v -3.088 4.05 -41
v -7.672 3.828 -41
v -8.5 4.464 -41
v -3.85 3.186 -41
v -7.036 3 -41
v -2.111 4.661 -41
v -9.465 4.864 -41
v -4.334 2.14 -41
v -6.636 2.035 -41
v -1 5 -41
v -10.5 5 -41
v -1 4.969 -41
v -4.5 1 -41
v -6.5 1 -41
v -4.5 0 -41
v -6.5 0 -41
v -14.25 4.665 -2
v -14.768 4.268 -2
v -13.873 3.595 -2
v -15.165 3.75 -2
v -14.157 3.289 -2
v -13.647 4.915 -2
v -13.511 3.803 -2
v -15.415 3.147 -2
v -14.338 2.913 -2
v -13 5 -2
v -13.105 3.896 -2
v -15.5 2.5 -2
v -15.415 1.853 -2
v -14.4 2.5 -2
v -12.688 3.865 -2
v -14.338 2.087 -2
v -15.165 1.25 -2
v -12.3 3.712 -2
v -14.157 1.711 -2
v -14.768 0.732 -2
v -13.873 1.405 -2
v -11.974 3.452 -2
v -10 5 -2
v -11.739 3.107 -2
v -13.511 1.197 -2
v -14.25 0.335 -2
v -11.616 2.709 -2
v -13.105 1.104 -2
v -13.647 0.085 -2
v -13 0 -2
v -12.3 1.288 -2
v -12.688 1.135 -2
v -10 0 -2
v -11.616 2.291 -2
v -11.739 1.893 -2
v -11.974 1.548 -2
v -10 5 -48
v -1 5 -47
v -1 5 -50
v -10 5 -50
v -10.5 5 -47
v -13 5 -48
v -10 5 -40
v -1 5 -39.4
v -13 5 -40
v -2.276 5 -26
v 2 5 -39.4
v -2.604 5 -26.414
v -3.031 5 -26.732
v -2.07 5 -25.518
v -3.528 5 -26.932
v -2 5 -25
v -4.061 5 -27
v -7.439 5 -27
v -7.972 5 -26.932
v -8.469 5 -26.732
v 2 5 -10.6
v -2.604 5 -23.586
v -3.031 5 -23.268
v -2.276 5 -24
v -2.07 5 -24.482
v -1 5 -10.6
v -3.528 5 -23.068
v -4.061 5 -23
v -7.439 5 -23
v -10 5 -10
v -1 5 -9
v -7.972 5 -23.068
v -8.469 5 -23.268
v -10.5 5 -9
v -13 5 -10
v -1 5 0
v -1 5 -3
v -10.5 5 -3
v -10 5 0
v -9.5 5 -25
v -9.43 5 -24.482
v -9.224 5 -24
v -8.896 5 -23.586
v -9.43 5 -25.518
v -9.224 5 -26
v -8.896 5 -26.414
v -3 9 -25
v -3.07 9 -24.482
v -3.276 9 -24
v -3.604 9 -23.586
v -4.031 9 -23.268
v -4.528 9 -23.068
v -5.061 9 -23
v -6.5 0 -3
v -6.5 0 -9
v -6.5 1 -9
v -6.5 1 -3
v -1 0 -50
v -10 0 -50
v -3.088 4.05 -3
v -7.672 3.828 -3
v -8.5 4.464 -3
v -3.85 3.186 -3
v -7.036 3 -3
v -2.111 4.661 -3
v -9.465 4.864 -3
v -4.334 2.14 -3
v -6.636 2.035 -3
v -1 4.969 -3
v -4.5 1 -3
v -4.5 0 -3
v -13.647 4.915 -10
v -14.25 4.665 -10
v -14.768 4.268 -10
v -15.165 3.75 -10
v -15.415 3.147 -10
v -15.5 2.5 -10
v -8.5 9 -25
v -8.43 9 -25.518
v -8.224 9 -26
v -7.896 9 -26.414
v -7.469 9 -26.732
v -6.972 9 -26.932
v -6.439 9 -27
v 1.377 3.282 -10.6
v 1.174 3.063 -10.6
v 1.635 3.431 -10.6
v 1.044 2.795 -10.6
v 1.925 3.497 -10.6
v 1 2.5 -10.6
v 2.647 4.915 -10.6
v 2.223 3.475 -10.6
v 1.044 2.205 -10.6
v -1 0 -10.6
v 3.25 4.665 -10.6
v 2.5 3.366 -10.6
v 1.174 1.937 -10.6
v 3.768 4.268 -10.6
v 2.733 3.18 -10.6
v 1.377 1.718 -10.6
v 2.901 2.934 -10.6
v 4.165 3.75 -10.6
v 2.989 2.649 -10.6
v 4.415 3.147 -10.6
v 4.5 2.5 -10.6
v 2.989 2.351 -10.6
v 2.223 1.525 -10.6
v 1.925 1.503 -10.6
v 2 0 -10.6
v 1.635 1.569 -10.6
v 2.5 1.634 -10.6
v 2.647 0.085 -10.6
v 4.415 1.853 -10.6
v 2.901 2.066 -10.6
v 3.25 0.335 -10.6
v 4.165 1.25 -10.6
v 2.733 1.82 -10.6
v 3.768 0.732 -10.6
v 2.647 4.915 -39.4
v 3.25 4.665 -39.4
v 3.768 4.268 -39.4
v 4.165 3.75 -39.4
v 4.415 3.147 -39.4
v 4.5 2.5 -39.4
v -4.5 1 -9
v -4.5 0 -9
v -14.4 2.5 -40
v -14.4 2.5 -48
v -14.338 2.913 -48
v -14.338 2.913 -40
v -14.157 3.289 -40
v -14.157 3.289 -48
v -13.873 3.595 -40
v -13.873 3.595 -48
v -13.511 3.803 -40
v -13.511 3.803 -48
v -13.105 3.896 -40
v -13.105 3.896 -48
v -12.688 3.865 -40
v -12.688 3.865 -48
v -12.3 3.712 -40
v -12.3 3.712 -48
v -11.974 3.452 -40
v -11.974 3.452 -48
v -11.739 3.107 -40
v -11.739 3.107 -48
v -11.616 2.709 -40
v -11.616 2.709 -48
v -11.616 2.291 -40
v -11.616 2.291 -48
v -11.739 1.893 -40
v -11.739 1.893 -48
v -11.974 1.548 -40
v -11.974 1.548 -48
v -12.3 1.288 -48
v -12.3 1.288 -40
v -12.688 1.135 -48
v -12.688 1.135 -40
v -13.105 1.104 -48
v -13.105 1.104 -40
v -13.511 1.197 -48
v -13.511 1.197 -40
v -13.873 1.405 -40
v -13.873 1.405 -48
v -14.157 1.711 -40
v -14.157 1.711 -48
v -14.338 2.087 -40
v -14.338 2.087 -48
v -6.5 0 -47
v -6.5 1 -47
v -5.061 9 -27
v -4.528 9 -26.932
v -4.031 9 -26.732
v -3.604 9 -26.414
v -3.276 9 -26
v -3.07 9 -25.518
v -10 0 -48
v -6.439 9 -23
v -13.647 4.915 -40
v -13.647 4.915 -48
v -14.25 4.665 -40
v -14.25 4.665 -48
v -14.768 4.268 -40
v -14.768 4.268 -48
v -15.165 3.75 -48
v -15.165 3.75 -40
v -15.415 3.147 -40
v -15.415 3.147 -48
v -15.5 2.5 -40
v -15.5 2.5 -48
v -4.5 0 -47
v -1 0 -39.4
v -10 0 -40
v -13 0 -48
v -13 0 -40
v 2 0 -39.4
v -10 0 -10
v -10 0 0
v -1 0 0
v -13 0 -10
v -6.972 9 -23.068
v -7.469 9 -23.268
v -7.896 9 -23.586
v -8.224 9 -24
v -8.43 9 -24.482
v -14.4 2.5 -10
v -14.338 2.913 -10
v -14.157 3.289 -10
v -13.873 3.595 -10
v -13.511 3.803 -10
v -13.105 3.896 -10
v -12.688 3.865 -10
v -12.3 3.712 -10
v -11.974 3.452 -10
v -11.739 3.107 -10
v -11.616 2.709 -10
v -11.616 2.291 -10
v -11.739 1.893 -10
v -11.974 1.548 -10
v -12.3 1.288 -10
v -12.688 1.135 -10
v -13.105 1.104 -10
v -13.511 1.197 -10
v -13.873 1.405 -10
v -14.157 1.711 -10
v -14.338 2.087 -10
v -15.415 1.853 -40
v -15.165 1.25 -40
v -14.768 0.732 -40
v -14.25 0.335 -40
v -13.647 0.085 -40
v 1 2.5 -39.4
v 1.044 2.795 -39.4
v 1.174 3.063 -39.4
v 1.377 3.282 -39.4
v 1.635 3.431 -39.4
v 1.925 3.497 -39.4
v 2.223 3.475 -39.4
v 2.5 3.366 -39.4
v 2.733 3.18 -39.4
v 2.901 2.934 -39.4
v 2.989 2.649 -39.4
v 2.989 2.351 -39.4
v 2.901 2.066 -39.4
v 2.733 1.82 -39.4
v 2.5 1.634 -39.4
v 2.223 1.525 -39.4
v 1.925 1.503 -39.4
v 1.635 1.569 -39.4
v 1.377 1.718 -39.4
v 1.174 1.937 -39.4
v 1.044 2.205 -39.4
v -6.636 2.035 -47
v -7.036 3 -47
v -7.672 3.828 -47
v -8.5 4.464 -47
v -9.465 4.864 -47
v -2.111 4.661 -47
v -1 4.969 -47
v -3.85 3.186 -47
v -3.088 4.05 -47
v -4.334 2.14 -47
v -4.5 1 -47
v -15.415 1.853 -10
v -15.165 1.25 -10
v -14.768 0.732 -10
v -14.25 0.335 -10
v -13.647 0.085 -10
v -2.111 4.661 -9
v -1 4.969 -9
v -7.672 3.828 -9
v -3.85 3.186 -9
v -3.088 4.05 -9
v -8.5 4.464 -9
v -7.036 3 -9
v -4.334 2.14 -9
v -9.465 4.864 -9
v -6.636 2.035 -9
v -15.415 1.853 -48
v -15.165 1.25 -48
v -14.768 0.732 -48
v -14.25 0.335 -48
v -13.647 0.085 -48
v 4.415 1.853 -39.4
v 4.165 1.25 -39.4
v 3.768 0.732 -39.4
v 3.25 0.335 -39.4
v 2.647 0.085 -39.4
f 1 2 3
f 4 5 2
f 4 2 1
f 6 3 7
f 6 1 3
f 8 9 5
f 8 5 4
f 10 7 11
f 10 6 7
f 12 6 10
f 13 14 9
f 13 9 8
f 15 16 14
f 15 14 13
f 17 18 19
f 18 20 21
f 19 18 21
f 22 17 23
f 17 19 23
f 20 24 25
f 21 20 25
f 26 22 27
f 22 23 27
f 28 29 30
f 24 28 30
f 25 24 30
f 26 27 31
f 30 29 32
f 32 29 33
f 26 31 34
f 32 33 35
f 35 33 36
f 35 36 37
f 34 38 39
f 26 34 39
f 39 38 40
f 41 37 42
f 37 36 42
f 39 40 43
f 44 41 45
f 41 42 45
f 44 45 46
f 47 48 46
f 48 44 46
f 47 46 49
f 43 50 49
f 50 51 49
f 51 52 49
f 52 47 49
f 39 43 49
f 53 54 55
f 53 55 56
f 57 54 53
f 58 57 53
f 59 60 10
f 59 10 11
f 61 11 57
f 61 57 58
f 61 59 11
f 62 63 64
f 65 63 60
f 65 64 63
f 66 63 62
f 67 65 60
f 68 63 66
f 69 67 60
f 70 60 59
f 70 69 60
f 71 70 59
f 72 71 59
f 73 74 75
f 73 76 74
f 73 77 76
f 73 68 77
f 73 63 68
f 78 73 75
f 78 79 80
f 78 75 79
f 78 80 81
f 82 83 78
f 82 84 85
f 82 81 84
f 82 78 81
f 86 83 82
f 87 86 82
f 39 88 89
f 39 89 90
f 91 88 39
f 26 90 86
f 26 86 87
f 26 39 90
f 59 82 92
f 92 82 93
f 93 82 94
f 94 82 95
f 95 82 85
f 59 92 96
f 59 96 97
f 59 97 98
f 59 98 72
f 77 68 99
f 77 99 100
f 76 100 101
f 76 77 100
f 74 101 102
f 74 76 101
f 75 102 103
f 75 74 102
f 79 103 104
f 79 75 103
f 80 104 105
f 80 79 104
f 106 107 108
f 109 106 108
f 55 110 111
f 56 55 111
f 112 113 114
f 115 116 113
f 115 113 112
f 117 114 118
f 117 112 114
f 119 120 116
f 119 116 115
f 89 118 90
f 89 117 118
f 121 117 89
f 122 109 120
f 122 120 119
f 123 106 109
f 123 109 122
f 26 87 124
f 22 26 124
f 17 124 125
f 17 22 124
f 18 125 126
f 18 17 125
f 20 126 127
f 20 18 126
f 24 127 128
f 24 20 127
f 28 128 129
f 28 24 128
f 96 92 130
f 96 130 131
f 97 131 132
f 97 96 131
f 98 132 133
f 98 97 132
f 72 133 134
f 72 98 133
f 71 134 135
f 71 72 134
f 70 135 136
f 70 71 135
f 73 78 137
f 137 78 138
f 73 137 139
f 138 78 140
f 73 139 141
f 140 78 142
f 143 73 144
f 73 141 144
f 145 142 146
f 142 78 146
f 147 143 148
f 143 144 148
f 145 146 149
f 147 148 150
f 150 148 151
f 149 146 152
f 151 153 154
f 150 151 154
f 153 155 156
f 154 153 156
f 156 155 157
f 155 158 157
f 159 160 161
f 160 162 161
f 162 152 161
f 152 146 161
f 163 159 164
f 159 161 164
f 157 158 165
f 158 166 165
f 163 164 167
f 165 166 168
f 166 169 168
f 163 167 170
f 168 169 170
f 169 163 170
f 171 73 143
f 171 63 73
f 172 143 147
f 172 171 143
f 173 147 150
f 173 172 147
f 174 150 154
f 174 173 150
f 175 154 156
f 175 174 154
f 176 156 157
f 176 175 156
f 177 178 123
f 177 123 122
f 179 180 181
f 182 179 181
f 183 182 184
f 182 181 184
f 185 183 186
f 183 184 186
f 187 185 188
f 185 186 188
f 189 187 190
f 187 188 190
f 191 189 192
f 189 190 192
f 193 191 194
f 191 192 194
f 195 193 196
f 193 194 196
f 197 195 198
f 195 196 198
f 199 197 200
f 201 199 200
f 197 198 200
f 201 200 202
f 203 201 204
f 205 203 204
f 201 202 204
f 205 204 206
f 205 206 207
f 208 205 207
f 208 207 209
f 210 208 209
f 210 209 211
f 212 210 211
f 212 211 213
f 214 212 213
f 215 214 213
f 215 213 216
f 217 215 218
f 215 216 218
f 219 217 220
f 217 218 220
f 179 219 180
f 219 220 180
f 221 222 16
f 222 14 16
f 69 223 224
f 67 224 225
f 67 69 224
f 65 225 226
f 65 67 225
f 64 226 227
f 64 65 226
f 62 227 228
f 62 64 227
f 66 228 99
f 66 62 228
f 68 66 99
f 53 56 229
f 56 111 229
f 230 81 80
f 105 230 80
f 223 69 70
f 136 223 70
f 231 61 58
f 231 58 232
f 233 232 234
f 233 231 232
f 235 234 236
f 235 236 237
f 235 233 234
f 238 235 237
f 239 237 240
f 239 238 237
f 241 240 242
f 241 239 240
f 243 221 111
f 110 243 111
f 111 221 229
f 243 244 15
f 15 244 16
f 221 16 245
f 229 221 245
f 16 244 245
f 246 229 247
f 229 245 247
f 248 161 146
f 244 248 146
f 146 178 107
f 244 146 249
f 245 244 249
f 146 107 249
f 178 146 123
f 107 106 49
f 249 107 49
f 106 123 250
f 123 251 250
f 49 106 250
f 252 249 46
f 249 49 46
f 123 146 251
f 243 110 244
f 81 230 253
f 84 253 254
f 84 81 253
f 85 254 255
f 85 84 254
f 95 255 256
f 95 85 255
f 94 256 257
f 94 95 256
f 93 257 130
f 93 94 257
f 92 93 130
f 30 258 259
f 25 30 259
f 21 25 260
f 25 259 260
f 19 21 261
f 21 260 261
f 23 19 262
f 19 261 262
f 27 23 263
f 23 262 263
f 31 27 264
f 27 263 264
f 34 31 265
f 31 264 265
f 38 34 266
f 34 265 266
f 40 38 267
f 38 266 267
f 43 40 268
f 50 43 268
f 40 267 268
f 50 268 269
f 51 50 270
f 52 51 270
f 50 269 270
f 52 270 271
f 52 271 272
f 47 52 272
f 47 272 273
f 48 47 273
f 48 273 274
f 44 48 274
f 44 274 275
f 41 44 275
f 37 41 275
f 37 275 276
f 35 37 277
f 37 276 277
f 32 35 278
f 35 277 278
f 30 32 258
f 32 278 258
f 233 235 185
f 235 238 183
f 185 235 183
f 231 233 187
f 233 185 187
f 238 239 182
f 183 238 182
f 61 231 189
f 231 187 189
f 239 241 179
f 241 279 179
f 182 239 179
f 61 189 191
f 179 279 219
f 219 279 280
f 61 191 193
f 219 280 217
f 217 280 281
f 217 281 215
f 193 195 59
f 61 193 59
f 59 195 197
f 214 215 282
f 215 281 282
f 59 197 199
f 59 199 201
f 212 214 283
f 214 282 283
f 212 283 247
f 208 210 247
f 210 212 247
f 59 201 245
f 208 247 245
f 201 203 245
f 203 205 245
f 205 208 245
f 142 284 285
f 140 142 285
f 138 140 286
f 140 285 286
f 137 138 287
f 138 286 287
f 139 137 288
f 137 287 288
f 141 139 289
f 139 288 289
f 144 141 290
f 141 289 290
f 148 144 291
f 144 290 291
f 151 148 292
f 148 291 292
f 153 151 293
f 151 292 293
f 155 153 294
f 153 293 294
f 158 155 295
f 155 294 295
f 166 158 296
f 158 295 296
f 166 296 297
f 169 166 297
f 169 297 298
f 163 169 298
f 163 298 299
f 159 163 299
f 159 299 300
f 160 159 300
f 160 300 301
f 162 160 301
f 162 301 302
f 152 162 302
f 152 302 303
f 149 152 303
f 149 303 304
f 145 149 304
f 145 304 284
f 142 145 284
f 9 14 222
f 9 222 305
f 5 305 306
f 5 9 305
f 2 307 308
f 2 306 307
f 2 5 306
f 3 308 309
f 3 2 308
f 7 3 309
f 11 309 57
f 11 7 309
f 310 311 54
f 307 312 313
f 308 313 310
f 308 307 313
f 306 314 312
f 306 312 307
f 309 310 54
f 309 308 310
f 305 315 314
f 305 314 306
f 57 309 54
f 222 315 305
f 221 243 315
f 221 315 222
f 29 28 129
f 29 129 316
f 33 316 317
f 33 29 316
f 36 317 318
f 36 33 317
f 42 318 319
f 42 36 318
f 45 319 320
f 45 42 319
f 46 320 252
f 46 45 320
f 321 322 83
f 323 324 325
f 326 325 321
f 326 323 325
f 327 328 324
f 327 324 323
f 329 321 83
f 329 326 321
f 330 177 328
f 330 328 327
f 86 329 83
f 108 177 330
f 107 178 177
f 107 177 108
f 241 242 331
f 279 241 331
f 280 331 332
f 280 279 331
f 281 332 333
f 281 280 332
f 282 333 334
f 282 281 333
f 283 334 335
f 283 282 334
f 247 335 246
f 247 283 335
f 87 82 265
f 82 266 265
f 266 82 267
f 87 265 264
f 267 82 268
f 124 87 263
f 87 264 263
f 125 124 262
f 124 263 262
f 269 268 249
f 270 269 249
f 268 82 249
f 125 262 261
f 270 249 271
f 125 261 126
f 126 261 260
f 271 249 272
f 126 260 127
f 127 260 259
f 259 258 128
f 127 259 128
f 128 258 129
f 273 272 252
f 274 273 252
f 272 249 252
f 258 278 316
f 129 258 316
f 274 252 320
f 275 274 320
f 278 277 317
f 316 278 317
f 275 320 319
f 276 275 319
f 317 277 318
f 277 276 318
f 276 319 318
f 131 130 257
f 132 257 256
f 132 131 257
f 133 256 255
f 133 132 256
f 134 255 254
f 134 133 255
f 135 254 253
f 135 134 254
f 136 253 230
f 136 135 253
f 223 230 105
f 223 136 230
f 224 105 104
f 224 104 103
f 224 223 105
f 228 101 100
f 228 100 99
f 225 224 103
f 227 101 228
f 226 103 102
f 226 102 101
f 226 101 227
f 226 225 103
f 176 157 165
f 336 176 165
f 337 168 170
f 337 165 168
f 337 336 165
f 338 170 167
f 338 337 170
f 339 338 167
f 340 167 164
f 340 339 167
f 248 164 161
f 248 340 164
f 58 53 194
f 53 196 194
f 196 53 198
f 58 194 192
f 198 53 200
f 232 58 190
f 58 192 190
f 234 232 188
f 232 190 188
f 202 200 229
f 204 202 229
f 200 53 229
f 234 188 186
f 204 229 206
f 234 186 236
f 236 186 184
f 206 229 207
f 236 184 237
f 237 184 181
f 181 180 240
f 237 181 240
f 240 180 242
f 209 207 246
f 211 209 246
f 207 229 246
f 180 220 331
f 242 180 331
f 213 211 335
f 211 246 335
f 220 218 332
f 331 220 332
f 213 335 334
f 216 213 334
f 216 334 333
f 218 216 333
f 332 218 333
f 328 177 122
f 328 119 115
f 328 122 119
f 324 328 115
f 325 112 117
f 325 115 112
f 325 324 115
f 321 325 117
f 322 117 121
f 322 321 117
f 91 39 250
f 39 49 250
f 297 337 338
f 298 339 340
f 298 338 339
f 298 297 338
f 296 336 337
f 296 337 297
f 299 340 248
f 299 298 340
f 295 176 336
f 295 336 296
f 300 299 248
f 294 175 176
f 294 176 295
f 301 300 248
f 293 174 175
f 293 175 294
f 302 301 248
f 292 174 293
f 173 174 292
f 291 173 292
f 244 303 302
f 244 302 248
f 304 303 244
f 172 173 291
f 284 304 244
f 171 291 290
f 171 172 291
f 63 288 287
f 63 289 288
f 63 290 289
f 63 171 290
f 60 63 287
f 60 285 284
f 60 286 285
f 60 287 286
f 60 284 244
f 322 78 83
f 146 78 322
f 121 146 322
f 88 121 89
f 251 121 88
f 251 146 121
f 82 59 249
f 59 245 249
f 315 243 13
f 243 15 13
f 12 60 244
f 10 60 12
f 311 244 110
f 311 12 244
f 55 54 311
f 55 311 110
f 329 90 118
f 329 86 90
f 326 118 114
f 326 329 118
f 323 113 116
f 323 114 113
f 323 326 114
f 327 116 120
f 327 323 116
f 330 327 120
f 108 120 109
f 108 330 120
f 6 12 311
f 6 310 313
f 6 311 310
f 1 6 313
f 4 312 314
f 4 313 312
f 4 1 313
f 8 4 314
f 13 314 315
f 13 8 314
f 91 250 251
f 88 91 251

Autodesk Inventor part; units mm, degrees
ref_plane "YZ Plane" through (0, 0, 0) normal (1, 0, 0) x (0, 1, 0)
ref_plane "XZ Plane" through (0, 0, 0) normal (0, 1, 0) x (-1, 0, 0)
sketch "Sketch1" plane through (0, 0, 0) normal (0, 1, 0) x (-1, 0, 0)
  line L0 (0, 0) -> (0, -10.6)
  line L1 (0, -10.6) -> (-4.5, -10.6)
  line L2 (-4.5, -10.6) -> (-4.5, -39.4)
  line L3 (-4.5, -39.4) -> (0, -39.4)
  line L4 (0, -39.4) -> (0, -50)
  line L5 (0, -50) -> (10, -50)
  line L6 (10, -50) -> (10, -48)
  line L7 (10, -48) -> (15.5, -48)
  line L8 (15.5, -48) -> (15.5, -40)
  line L9 (15.5, -40) -> (10, -40)
  line L10 (10, -40) -> (10, -10)
  line L11 (10, -10) -> (15.5, -10)
  line L12 (15.5, -10) -> (15.5, -2)
  line L13 (15.5, -2) -> (10, -2)
  line L14 (10, -2) -> (10, 0)
  line L15 (10, 0) -> (0, 0)
  line L16 (10.5, -3) -> (0.5, -3)
  line L17 (0.5, -3) -> (0.5, -9)
  line L18 (0.5, -9) -> (10.5, -9)
  line L19 (10.5, -9) -> (10.5, -3)
  line L20 (10.5, -41) -> (0.5, -41)
  line L21 (0.5, -41) -> (0.5, -47)
  line L22 (0.5, -47) -> (10.5, -47)
  line L23 (10.5, -47) -> (10.5, -41)
  dimension "d0" = 20
  dimension "d1" = 50
  dimension "d2" = 10.6
  dimension "d3" = 10.6
  dimension "d4" = 2
  dimension "d5" = 2
  dimension "d6" = 8
  dimension "d7" = 8
  dimension "d8" = 4.5
  dimension "d9" = 5.5
  dimension "d10" = 5.5
  dimension "d11" = 5.5
  dimension "d12" = 5.5
  dimension "d13" = 10
  dimension "d14" = 6
  dimension "d15" = 5
  dimension "d16" = 3
  dimension "d17" = 10
  dimension "d18" = 6
  dimension "d19" = 3
extrude "Extrusion1" add sketch "Sketch1" along normal blind 5
sketch "Sketch2" plane through (-10.5, 0, -9) normal (0, 0, 1) x (1, 0, 0)
  point P0 (10.5, 0)
ref_plane "Work Plane1" through (-5.5, 5, -9) normal (0, 0, 1) x (1, 0, 0)
sketch "Sketch4" plane through (-5.5, 5, -9) normal (0, 0, 1) x (1, 0, 0)
  line L0 (-5, -5) -> (5, -5) projected
  line L1 (5, -5) -> (-5, -5) projected
  line L2 (-5, -5) -> (5, -5) projected
  line L3 (5, -5) -> (-5, -5) projected
  line L4 (-4.5, -5) -> (5.5, -5) projected
  line L5 (-10, -5) -> (-4.5, -5) projected
  line L6 (-4.5, -5) -> (-10, -5) projected
  line L7 (-10, -5) -> (-4.5, -5) projected
  line L8 (-4.5, -5) -> (-10, -5) projected
  line L9 (5.5, -5) -> (-4.5, -5) projected
  line L10 (10, -5) -> (5.5, -5) projected
  line L11 (5.5, -5) -> (10, -5) projected
  line L12 (-5, 0) -> (5, 0) projected
  line L13 (5, 0) -> (-5, 0) projected
  line L14 (-5, 0) -> (5, 0) projected
  line L15 (5, 0) -> (-5, 0) projected
  line L16 (5.5, 0) -> (10, 0) projected
  line L17 (10, 0) -> (5.5, 0) projected
  line L18 (5.5, 0) -> (-4.5, 0) projected
  line L19 (-4.5, 0) -> (-10, 0) projected
  line L20 (-10, 0) -> (-4.5, 0) projected
  line L21 (-4.5, 0) -> (-10, 0) projected
  line L22 (-10, 0) -> (-4.5, 0) projected
  line L23 (-4.5, 0) -> (5.5, 0) projected
  line L24 (5, -5) -> (5, 0) projected
  line L25 (-5, -5) -> (-5, 0) projected
  line L26 (5.5, -5) -> (-4.5, -5) projected
  line L27 (-5, -5) -> (-5, 0) construction
  line L28 (-5, -5) -> (0, -5) construction
  line L29 (5, -5) -> (5, 0) projected
  line L30 (5, -5) -> (5, 0) construction
  line L31 (5, -5) -> (10, -5) construction
  line L32 (-5, 0) -> (-5, -5)
  line L33 (0, -5) -> (5, -5)
  line L34 (5, 0) -> (5, -5)
  line L35 (5.5, 0) -> (-4.5, 0) projected
  line L36 (-5, -5) -> (0, -5)
  line L37 (-5, -5) -> (-1, -5)
  line L38 (-1, -5) -> (-1, -4)
  line L39 (5, -5) -> (1, -5)
  line L40 (1, -5) -> (1, -4)
  line L41 (-5, -5) -> (-5, -4)
  line L42 (-5, -5) -> (-5, 0) projected
  line L43 (5, -5) -> (5, -4)
  arc A0 (5, 0) -> (1, -4) centre (5, -4) ccw
  arc A1 (-1, -4) -> (-5, 0) centre (-5, -4) ccw
  dimension "d26" = 90
  dimension "d28" = 90
  dimension "d48" = 4
  dimension "d49" = 1
  dimension "d50" = 4
  dimension "d51" = 1
  dimension "d52" = 4
extrude "Extrusion2" add sketch "Sketch4" along normal blind 6 contours L25 A1 L38 L0 | L40 A0 L24 L0
sketch "Sketch6" plane through (-10, 0, -48) normal (0, 0, -1) x (-1, 0, 0)
  circle A0 centre (3, 2.5) radius 1.4
  line L0 (0, 0) -> (5.5, 0) projected
  line L1 (5.5, 0) -> (5.5, 5) projected
  line L2 (0, 5) -> (5.5, 5) projected
  line L3 (0, 0) -> (0, 5) projected
  point P0 (-10, 0)
  dimension "d34" = 2.5
  dimension "d35" = 2.5
  dimension "d47" = 2.8
extrude "Extrusion4" cut sketch "Sketch6" against normal through all contours A0
sketch "Sketch7" plane through (4.5, 0, -39.4) normal (0, 0, -1) x (-1, 0, 0)
  circle A0 centre (2.5, 2.5) radius 1
  line L0 (0, 5) -> (4.5, 5) projected
  line L1 (0, 0) -> (0, 5) projected
  point P0 (4.5, 0)
  dimension "d38" = 2
  dimension "d39" = 2.5
  dimension "d40" = 2.5
extrude "Extrusion5" cut sketch "Sketch7" against normal through all
sketch "Sketch8" plane through (-10, 0, -10) normal (0, 0, -1) x (-1, 0, 0)
  point P0 (-10, 0)
sketch "Sketch12" plane through (-0.5, 0, -41) normal (0, 0, -1) x (-1, 0, 0)
  line L0 (6, 1) -> (6, 0) projected
  line L1 (4, 0) -> (6, 0) projected
  line L2 (4, 0) -> (4, 1) projected
  arc A0 (4, 1) -> (0, 5) centre (0, 1) ccw projected
  line L3 (10, 5) -> (0, 5) projected
  arc A1 (10, 5) -> (6, 1) centre (10, 1) ccw projected
  arc A2 (4, 1) -> (0, 5) centre (0, 1) ccw
  arc A3 (10, 5) -> (6, 1) centre (10, 1) ccw
  line L4 (4, 0) -> (6, 0) projected
  line L5 (6, 1) -> (6, 0)
  line L6 (6, 0) -> (10, 0)
  line L7 (15, 0) -> (9.5, 0) projected
  line L8 (10, 5) -> (10, 0)
  line L9 (10, 0) -> (6, 0)
  line L10 (9.5, 0) -> (-0.5, 0) projected
  line L11 (4, 0) -> (0, 0)
  arc A4 (4, 1) -> (0, 5) centre (0, 1) ccw projected
  line L12 (0, 0) -> (0, 5)
  line L13 (4, 0) -> (4, 1) projected
  line L14 (4, 0) -> (4, 1)
  dimension "d54" = 5
extrude "Extrusion6" add sketch "Sketch12" along normal blind 6 contours A1 L8 L6 L0 | L10 L12 A0 L2
fillet "Fillet5" radius 2.5 6 edges at (-15.5, 5, -6) (-15.5, 5, -44) (4.5, 5, -25) (-15.5, 0, -6) (4.5, 0, -25) (-15.5, 0, -44)
sketch "Sketch13" plane through (0, 5, 0) normal (0, 1, 0) x (1, 0, 0)
  line L0 (-10, 0) -> (0, 0) projected
  line L1 (0, 0) -> (-1, 0)
  line L2 (-1, 0) -> (-1, 10.5)
  line L3 (-1, 10.5) -> (0, 10.5)
  line L4 (0, 10.5) -> (0, 0)
  line L5 (0, 39.4) -> (0, 50) projected
  line L6 (0, 39.4) -> (-1, 39.4)
  line L7 (-1, 39.4) -> (-1, 50)
  line L8 (-1, 50) -> (0, 50)
  line L9 (0, 50) -> (0, 39.4)
  dimension "d58" = 1
extrude "Extrusion7" cut sketch "Sketch13" against normal through all
sketch "Sketch14" plane through (0, 0, 0) normal (0, -1, 0) x (1, 0, 0)
  point P0 (0, 0)
sketch "Sketch15" plane through (0, 5, 0) normal (0, 1, 0) x (1, 0, 0)
  line L0 (-9.5, 23) -> (-2, 23)
  line L1 (-2, 23) -> (-2, 27)
  line L2 (-2, 27) -> (-9.5, 27)
  line L3 (-9.5, 27) -> (-9.5, 23)
  line L4 (-10, 0) -> (-1, 0) projected
  line L5 (-1, 39.4) -> (-1, 41) projected
  point P0 (0, 0)
  dimension "d61" = 4
  dimension "d62" = 7.5
  dimension "d63" = 23
  dimension "d64" = 1
extrude "Extrusion8" add sketch "Sketch15" along normal blind 4
sketch "Sketch17" plane through (-9.5, 5, -23) normal (0, 0, 1) x (1, 0, 0)
  line L0 (8.5, 0) -> (-1, 0) projected
  line L1 (0, 0) -> (0, 4) projected
  line L2 (0, 0) -> (0, 4)
  line L3 (0, 4) -> (1, 4)
  line L4 (7.5, 4) -> (0, 4) projected
  line L5 (1, 4) -> (0, 0)
  line L6 (7.5, 4) -> (7.5, 0)
  line L7 (7.5, 0) -> (7.5, 4) projected
  line L8 (7.5, 4) -> (6.5, 4)
  line L9 (6.5, 4) -> (7.5, 0)
  point P0 (9.5, -5)
  dimension "d69" = 1
  dimension "d70" = 1
extrude "Extrusion9" cut sketch "Sketch17" against normal through all contours L9 L4 L6 | L1 L3 L5
fillet "Fillet6" radius 2 4 edges at (-9, 7, -23) (-2.5, 7, -23) (-2.5, 7, -27) (-9, 7, -27)
sketch "Sketch18" plane through (0, 0, 0) normal (0, -1, 0) x (1, 0, 0)
  line L0 (0, -10.5) -> (0, -10.6) projected
  line L1 (0, -10.5) -> (0, -10.6)
  line L2 (0, -10.6) -> (-1, -10.6)
  line L3 (-1, -9) -> (-1, -10.5) projected
  line L4 (-1, -10.6) -> (-1, -10.5)
  line L5 (-1, -10.5) -> (0, -10.5)
  point P0 (0, 0)
  dimension "d74" = 1
extrude "Extrusion10" cut sketch "Sketch18" against normal through all
properties part number "tracks"
